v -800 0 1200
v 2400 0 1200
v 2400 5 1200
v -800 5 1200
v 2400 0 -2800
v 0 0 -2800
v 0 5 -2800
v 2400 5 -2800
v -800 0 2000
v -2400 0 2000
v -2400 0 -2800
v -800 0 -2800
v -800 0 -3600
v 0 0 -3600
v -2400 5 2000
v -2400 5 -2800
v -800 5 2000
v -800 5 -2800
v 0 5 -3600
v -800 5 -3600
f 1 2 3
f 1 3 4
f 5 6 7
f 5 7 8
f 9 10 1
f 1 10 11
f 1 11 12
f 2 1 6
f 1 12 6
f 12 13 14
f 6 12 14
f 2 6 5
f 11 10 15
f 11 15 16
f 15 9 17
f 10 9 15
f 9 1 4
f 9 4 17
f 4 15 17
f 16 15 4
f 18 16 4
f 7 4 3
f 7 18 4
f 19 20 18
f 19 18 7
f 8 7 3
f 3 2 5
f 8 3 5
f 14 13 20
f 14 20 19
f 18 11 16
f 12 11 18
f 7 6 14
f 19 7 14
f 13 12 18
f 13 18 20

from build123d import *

# Parameters (mm, degrees)
SKETCH_1_W          = 4800
SKETCH_1_H          = 5600
EXTRUDE_1_DEPTH     = 5
CUT_EXTRUDE_2_DEPTH = 5
SKETCH_3_W          = 800
SKETCH_3_H          = 800
EXTRUDE_2_DEPTH     = 5


with BuildPart() as part:
    # 草图1 → 凸台-拉伸1 (new body)
    with BuildSketch(Plane(origin=(0, 0, 0), x_dir=(1, 0, 0), z_dir=(0, 1, 0))):
        Rectangle(SKETCH_1_W, SKETCH_1_H)
    extrude(amount=EXTRUDE_1_DEPTH)

    # 草图2 → 切除-拉伸2 (cut)
    with BuildSketch(Plane(origin=(0, 0, 0), x_dir=(1, 0, 0), z_dir=(0, 1, 0))):
        Polygon((-800, -2800), (2400, -2800), (2400, -1200), (-800, -1200), (-800, -2000), (-2400, -2000), (-2400, -2800), align=None)
    extrude(amount=CUT_EXTRUDE_2_DEPTH, mode=Mode.SUBTRACT)

    # 草图3 → 凸台-拉伸2 (add)
    with BuildSketch(Plane(origin=(0, 0, 0), x_dir=(1, 0, 0), z_dir=(0, 1, 0))):
        with Locations((-400, 3200)):
            Rectangle(SKETCH_3_W, SKETCH_3_H)
    extrude(amount=EXTRUDE_2_DEPTH)


solid = part.part
